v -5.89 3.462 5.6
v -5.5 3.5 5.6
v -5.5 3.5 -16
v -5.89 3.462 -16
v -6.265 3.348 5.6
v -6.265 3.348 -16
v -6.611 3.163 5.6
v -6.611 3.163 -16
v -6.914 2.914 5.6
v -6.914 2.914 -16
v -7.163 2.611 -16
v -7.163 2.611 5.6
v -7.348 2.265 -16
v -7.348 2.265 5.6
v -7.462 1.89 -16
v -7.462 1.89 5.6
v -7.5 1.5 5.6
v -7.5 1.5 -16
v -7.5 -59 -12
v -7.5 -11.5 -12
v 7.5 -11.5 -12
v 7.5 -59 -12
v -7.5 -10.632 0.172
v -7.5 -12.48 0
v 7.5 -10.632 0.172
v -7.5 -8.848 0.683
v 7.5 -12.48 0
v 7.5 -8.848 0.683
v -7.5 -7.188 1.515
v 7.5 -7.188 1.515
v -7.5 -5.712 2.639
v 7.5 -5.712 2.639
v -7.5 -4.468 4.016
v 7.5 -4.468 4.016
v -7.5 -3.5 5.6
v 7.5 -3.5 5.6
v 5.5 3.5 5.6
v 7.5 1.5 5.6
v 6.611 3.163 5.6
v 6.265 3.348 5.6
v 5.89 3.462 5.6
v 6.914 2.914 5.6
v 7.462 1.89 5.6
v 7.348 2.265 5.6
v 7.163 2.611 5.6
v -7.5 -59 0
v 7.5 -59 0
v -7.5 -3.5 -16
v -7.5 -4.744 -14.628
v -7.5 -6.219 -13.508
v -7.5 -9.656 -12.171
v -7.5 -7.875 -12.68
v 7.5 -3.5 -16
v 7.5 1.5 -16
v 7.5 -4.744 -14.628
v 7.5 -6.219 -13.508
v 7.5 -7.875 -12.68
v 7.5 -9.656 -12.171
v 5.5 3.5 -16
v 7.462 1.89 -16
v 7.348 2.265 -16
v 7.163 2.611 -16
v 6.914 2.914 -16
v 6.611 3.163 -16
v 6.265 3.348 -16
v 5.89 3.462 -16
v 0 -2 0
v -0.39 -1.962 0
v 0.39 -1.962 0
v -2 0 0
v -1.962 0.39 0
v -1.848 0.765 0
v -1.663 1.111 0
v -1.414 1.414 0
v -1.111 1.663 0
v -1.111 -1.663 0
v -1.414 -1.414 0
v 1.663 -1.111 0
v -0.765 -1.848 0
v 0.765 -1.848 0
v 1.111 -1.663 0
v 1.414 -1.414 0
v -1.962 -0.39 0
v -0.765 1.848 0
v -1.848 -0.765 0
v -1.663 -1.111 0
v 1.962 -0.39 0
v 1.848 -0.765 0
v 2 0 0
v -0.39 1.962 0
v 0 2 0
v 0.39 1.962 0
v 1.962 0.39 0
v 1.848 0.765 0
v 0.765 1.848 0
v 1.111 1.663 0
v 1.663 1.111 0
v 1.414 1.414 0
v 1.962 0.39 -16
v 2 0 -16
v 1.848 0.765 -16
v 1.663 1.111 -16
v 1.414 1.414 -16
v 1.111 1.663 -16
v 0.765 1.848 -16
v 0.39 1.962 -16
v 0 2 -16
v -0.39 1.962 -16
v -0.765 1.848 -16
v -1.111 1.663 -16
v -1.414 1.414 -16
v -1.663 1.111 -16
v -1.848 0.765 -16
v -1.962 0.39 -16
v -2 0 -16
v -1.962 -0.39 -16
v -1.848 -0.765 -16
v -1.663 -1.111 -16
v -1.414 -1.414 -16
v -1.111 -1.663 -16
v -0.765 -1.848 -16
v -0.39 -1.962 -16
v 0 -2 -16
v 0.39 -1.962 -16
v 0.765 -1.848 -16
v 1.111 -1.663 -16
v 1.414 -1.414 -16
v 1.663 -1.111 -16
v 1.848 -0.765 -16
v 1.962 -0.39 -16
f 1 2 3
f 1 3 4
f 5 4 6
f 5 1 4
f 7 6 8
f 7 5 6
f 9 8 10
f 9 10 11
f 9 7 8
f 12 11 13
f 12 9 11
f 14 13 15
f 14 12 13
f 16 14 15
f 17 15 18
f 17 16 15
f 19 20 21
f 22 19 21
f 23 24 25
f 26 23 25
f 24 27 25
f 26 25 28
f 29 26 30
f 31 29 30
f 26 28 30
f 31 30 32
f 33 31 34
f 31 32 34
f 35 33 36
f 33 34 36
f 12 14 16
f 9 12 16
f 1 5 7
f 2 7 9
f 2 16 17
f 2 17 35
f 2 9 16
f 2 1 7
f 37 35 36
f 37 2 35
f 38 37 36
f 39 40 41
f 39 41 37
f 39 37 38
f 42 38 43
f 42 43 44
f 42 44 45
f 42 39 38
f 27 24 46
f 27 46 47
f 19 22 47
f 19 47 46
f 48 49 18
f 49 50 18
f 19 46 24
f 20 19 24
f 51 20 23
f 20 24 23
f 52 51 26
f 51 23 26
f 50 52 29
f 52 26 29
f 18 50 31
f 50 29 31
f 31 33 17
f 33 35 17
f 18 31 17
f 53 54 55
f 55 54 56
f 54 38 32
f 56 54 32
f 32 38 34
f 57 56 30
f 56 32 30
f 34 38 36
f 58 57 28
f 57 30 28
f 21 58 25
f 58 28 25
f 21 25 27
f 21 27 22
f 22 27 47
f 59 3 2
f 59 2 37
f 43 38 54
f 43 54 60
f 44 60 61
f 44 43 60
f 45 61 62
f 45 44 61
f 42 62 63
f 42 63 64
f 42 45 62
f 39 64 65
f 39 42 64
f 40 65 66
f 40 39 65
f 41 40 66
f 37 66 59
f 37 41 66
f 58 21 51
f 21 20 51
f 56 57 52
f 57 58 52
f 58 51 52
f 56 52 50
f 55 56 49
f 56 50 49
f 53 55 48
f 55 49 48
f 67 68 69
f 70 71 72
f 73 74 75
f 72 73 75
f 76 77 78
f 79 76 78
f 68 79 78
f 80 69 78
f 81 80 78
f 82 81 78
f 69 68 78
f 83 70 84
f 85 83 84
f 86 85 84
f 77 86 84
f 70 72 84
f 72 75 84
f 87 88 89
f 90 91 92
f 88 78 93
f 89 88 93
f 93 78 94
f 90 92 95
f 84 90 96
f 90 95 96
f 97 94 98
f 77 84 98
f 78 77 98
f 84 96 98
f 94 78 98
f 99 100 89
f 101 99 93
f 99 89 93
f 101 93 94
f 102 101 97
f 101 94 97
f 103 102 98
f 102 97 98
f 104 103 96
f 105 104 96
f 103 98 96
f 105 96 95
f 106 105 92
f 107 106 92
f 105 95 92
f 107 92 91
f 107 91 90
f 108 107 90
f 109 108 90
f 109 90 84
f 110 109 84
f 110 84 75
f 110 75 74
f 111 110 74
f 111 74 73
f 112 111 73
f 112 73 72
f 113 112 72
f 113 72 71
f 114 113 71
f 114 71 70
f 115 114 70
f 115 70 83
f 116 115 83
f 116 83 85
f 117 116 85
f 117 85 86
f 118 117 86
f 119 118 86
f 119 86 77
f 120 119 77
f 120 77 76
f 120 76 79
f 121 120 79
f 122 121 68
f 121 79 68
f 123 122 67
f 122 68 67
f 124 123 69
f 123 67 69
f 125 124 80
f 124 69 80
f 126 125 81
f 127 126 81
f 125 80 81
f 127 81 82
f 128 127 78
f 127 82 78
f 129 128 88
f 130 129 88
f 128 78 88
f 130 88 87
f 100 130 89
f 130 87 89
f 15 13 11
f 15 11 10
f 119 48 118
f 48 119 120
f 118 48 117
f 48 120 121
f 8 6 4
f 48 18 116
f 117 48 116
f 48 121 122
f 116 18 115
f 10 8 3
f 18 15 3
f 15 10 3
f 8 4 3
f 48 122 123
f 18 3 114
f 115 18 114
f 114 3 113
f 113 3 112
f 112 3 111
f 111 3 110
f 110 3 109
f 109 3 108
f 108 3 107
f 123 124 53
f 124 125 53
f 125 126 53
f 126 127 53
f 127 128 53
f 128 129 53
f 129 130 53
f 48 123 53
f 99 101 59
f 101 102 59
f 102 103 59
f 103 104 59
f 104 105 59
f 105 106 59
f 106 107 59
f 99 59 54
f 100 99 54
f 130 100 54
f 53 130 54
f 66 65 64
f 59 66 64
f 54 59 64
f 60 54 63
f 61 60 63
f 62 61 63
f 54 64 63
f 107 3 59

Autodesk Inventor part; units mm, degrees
ref_plane "YZ Plane" through (0, 0, 0) normal (1, 0, 0) x (0, 1, 0)
ref_plane "XZ Plane" through (0, 0, 0) normal (0, 1, 0) x (-1, 0, 0)
ref_plane "XY Plane" through (0, 0, 0) normal (0, 0, 1) x (1, 0, 0)
sketch "Sketch1" plane through (0, 0, 0) normal (0, 0, 1) x (1, 0, 0)
  circle A0 centre (0, 0) radius 2
  line L0 (-5.5, 3.5) -> (5.5, 3.5)
  line L1 (7.5, 1.5) -> (7.5, -3.5)
  line L2 (7.5, -3.5) -> (-7.5, -3.5)
  line L3 (-7.5, -3.5) -> (-7.5, 1.5)
  arc A1 (-5.5, 3.5) -> (-7.5, 1.5) centre (-5.5, 1.5) ccw
  arc A2 (7.5, 1.5) -> (5.5, 3.5) centre (5.5, 1.5) ccw
  point P0 (7.5, 3.5)
  dimension "d0" = 4
  dimension "d1" = 15
  dimension "d2" = 7
  dimension "d3" = 7.5
  dimension "d4" = 3.5
  dimension "d5" = 2
extrude "Extrusion1" add sketch "Sketch1" against normal blind 16
sketch "Sketch2" plane through (-7.5, -3.5, 0) normal (0, -1, 0) x (-1, 0, 0)
  line L0 (-15, 0) -> (-13, 0) projected
  line L1 (0, 12) -> (-15, 12)
  line L2 (-15, 12) -> (-15, 0)
  line L3 (-15, 0) -> (0, 0)
  line L4 (0, 0) -> (0, 12)
  line L5 (-15, 16) -> (0, 16) projected
  line L6 (0, 0) -> (0, 16) projected
  point P0 (-7.5, 0)
  dimension "d8" = 4
  dimension "d9" = 0
  dimension "d18" = 15
  dimension "d19" = 12
extrude "Extrusion2" add sketch "Sketch2" along normal blind 55.5
fillet "Fillet2" radius 10 1 edges at (0, -3.5, -12)
sketch "Sketch4" plane through (0, 0, 0) normal (0, 0, 1) x (1, 0, 0)
  line L0 (7.5, -3.5) -> (-7.5, -3.5) projected
  line L1 (7.5, -3.5) -> (-7.5, -3.5)
  line L2 (-7.5, -3.5) -> (-7.5, 1.5)
  line L3 (-5.5, 3.5) -> (5.5, 3.5)
  line L4 (7.5, 1.5) -> (7.5, -3.5)
  arc A0 (-5.5, 3.5) -> (-7.5, 1.5) centre (-5.5, 1.5) ccw
  arc A1 (7.5, 1.5) -> (5.5, 3.5) centre (5.5, 1.5) ccw
  point P0 (0, 0)
  dimension "d14" = 2
extrude "Extrusion3" add sketch "Sketch4" along normal blind 5.6
fillet "Fillet3" radius 10 1 edges at (0, -3.5, 0)
properties part number "frontside arm" material "UHMW, Black"
